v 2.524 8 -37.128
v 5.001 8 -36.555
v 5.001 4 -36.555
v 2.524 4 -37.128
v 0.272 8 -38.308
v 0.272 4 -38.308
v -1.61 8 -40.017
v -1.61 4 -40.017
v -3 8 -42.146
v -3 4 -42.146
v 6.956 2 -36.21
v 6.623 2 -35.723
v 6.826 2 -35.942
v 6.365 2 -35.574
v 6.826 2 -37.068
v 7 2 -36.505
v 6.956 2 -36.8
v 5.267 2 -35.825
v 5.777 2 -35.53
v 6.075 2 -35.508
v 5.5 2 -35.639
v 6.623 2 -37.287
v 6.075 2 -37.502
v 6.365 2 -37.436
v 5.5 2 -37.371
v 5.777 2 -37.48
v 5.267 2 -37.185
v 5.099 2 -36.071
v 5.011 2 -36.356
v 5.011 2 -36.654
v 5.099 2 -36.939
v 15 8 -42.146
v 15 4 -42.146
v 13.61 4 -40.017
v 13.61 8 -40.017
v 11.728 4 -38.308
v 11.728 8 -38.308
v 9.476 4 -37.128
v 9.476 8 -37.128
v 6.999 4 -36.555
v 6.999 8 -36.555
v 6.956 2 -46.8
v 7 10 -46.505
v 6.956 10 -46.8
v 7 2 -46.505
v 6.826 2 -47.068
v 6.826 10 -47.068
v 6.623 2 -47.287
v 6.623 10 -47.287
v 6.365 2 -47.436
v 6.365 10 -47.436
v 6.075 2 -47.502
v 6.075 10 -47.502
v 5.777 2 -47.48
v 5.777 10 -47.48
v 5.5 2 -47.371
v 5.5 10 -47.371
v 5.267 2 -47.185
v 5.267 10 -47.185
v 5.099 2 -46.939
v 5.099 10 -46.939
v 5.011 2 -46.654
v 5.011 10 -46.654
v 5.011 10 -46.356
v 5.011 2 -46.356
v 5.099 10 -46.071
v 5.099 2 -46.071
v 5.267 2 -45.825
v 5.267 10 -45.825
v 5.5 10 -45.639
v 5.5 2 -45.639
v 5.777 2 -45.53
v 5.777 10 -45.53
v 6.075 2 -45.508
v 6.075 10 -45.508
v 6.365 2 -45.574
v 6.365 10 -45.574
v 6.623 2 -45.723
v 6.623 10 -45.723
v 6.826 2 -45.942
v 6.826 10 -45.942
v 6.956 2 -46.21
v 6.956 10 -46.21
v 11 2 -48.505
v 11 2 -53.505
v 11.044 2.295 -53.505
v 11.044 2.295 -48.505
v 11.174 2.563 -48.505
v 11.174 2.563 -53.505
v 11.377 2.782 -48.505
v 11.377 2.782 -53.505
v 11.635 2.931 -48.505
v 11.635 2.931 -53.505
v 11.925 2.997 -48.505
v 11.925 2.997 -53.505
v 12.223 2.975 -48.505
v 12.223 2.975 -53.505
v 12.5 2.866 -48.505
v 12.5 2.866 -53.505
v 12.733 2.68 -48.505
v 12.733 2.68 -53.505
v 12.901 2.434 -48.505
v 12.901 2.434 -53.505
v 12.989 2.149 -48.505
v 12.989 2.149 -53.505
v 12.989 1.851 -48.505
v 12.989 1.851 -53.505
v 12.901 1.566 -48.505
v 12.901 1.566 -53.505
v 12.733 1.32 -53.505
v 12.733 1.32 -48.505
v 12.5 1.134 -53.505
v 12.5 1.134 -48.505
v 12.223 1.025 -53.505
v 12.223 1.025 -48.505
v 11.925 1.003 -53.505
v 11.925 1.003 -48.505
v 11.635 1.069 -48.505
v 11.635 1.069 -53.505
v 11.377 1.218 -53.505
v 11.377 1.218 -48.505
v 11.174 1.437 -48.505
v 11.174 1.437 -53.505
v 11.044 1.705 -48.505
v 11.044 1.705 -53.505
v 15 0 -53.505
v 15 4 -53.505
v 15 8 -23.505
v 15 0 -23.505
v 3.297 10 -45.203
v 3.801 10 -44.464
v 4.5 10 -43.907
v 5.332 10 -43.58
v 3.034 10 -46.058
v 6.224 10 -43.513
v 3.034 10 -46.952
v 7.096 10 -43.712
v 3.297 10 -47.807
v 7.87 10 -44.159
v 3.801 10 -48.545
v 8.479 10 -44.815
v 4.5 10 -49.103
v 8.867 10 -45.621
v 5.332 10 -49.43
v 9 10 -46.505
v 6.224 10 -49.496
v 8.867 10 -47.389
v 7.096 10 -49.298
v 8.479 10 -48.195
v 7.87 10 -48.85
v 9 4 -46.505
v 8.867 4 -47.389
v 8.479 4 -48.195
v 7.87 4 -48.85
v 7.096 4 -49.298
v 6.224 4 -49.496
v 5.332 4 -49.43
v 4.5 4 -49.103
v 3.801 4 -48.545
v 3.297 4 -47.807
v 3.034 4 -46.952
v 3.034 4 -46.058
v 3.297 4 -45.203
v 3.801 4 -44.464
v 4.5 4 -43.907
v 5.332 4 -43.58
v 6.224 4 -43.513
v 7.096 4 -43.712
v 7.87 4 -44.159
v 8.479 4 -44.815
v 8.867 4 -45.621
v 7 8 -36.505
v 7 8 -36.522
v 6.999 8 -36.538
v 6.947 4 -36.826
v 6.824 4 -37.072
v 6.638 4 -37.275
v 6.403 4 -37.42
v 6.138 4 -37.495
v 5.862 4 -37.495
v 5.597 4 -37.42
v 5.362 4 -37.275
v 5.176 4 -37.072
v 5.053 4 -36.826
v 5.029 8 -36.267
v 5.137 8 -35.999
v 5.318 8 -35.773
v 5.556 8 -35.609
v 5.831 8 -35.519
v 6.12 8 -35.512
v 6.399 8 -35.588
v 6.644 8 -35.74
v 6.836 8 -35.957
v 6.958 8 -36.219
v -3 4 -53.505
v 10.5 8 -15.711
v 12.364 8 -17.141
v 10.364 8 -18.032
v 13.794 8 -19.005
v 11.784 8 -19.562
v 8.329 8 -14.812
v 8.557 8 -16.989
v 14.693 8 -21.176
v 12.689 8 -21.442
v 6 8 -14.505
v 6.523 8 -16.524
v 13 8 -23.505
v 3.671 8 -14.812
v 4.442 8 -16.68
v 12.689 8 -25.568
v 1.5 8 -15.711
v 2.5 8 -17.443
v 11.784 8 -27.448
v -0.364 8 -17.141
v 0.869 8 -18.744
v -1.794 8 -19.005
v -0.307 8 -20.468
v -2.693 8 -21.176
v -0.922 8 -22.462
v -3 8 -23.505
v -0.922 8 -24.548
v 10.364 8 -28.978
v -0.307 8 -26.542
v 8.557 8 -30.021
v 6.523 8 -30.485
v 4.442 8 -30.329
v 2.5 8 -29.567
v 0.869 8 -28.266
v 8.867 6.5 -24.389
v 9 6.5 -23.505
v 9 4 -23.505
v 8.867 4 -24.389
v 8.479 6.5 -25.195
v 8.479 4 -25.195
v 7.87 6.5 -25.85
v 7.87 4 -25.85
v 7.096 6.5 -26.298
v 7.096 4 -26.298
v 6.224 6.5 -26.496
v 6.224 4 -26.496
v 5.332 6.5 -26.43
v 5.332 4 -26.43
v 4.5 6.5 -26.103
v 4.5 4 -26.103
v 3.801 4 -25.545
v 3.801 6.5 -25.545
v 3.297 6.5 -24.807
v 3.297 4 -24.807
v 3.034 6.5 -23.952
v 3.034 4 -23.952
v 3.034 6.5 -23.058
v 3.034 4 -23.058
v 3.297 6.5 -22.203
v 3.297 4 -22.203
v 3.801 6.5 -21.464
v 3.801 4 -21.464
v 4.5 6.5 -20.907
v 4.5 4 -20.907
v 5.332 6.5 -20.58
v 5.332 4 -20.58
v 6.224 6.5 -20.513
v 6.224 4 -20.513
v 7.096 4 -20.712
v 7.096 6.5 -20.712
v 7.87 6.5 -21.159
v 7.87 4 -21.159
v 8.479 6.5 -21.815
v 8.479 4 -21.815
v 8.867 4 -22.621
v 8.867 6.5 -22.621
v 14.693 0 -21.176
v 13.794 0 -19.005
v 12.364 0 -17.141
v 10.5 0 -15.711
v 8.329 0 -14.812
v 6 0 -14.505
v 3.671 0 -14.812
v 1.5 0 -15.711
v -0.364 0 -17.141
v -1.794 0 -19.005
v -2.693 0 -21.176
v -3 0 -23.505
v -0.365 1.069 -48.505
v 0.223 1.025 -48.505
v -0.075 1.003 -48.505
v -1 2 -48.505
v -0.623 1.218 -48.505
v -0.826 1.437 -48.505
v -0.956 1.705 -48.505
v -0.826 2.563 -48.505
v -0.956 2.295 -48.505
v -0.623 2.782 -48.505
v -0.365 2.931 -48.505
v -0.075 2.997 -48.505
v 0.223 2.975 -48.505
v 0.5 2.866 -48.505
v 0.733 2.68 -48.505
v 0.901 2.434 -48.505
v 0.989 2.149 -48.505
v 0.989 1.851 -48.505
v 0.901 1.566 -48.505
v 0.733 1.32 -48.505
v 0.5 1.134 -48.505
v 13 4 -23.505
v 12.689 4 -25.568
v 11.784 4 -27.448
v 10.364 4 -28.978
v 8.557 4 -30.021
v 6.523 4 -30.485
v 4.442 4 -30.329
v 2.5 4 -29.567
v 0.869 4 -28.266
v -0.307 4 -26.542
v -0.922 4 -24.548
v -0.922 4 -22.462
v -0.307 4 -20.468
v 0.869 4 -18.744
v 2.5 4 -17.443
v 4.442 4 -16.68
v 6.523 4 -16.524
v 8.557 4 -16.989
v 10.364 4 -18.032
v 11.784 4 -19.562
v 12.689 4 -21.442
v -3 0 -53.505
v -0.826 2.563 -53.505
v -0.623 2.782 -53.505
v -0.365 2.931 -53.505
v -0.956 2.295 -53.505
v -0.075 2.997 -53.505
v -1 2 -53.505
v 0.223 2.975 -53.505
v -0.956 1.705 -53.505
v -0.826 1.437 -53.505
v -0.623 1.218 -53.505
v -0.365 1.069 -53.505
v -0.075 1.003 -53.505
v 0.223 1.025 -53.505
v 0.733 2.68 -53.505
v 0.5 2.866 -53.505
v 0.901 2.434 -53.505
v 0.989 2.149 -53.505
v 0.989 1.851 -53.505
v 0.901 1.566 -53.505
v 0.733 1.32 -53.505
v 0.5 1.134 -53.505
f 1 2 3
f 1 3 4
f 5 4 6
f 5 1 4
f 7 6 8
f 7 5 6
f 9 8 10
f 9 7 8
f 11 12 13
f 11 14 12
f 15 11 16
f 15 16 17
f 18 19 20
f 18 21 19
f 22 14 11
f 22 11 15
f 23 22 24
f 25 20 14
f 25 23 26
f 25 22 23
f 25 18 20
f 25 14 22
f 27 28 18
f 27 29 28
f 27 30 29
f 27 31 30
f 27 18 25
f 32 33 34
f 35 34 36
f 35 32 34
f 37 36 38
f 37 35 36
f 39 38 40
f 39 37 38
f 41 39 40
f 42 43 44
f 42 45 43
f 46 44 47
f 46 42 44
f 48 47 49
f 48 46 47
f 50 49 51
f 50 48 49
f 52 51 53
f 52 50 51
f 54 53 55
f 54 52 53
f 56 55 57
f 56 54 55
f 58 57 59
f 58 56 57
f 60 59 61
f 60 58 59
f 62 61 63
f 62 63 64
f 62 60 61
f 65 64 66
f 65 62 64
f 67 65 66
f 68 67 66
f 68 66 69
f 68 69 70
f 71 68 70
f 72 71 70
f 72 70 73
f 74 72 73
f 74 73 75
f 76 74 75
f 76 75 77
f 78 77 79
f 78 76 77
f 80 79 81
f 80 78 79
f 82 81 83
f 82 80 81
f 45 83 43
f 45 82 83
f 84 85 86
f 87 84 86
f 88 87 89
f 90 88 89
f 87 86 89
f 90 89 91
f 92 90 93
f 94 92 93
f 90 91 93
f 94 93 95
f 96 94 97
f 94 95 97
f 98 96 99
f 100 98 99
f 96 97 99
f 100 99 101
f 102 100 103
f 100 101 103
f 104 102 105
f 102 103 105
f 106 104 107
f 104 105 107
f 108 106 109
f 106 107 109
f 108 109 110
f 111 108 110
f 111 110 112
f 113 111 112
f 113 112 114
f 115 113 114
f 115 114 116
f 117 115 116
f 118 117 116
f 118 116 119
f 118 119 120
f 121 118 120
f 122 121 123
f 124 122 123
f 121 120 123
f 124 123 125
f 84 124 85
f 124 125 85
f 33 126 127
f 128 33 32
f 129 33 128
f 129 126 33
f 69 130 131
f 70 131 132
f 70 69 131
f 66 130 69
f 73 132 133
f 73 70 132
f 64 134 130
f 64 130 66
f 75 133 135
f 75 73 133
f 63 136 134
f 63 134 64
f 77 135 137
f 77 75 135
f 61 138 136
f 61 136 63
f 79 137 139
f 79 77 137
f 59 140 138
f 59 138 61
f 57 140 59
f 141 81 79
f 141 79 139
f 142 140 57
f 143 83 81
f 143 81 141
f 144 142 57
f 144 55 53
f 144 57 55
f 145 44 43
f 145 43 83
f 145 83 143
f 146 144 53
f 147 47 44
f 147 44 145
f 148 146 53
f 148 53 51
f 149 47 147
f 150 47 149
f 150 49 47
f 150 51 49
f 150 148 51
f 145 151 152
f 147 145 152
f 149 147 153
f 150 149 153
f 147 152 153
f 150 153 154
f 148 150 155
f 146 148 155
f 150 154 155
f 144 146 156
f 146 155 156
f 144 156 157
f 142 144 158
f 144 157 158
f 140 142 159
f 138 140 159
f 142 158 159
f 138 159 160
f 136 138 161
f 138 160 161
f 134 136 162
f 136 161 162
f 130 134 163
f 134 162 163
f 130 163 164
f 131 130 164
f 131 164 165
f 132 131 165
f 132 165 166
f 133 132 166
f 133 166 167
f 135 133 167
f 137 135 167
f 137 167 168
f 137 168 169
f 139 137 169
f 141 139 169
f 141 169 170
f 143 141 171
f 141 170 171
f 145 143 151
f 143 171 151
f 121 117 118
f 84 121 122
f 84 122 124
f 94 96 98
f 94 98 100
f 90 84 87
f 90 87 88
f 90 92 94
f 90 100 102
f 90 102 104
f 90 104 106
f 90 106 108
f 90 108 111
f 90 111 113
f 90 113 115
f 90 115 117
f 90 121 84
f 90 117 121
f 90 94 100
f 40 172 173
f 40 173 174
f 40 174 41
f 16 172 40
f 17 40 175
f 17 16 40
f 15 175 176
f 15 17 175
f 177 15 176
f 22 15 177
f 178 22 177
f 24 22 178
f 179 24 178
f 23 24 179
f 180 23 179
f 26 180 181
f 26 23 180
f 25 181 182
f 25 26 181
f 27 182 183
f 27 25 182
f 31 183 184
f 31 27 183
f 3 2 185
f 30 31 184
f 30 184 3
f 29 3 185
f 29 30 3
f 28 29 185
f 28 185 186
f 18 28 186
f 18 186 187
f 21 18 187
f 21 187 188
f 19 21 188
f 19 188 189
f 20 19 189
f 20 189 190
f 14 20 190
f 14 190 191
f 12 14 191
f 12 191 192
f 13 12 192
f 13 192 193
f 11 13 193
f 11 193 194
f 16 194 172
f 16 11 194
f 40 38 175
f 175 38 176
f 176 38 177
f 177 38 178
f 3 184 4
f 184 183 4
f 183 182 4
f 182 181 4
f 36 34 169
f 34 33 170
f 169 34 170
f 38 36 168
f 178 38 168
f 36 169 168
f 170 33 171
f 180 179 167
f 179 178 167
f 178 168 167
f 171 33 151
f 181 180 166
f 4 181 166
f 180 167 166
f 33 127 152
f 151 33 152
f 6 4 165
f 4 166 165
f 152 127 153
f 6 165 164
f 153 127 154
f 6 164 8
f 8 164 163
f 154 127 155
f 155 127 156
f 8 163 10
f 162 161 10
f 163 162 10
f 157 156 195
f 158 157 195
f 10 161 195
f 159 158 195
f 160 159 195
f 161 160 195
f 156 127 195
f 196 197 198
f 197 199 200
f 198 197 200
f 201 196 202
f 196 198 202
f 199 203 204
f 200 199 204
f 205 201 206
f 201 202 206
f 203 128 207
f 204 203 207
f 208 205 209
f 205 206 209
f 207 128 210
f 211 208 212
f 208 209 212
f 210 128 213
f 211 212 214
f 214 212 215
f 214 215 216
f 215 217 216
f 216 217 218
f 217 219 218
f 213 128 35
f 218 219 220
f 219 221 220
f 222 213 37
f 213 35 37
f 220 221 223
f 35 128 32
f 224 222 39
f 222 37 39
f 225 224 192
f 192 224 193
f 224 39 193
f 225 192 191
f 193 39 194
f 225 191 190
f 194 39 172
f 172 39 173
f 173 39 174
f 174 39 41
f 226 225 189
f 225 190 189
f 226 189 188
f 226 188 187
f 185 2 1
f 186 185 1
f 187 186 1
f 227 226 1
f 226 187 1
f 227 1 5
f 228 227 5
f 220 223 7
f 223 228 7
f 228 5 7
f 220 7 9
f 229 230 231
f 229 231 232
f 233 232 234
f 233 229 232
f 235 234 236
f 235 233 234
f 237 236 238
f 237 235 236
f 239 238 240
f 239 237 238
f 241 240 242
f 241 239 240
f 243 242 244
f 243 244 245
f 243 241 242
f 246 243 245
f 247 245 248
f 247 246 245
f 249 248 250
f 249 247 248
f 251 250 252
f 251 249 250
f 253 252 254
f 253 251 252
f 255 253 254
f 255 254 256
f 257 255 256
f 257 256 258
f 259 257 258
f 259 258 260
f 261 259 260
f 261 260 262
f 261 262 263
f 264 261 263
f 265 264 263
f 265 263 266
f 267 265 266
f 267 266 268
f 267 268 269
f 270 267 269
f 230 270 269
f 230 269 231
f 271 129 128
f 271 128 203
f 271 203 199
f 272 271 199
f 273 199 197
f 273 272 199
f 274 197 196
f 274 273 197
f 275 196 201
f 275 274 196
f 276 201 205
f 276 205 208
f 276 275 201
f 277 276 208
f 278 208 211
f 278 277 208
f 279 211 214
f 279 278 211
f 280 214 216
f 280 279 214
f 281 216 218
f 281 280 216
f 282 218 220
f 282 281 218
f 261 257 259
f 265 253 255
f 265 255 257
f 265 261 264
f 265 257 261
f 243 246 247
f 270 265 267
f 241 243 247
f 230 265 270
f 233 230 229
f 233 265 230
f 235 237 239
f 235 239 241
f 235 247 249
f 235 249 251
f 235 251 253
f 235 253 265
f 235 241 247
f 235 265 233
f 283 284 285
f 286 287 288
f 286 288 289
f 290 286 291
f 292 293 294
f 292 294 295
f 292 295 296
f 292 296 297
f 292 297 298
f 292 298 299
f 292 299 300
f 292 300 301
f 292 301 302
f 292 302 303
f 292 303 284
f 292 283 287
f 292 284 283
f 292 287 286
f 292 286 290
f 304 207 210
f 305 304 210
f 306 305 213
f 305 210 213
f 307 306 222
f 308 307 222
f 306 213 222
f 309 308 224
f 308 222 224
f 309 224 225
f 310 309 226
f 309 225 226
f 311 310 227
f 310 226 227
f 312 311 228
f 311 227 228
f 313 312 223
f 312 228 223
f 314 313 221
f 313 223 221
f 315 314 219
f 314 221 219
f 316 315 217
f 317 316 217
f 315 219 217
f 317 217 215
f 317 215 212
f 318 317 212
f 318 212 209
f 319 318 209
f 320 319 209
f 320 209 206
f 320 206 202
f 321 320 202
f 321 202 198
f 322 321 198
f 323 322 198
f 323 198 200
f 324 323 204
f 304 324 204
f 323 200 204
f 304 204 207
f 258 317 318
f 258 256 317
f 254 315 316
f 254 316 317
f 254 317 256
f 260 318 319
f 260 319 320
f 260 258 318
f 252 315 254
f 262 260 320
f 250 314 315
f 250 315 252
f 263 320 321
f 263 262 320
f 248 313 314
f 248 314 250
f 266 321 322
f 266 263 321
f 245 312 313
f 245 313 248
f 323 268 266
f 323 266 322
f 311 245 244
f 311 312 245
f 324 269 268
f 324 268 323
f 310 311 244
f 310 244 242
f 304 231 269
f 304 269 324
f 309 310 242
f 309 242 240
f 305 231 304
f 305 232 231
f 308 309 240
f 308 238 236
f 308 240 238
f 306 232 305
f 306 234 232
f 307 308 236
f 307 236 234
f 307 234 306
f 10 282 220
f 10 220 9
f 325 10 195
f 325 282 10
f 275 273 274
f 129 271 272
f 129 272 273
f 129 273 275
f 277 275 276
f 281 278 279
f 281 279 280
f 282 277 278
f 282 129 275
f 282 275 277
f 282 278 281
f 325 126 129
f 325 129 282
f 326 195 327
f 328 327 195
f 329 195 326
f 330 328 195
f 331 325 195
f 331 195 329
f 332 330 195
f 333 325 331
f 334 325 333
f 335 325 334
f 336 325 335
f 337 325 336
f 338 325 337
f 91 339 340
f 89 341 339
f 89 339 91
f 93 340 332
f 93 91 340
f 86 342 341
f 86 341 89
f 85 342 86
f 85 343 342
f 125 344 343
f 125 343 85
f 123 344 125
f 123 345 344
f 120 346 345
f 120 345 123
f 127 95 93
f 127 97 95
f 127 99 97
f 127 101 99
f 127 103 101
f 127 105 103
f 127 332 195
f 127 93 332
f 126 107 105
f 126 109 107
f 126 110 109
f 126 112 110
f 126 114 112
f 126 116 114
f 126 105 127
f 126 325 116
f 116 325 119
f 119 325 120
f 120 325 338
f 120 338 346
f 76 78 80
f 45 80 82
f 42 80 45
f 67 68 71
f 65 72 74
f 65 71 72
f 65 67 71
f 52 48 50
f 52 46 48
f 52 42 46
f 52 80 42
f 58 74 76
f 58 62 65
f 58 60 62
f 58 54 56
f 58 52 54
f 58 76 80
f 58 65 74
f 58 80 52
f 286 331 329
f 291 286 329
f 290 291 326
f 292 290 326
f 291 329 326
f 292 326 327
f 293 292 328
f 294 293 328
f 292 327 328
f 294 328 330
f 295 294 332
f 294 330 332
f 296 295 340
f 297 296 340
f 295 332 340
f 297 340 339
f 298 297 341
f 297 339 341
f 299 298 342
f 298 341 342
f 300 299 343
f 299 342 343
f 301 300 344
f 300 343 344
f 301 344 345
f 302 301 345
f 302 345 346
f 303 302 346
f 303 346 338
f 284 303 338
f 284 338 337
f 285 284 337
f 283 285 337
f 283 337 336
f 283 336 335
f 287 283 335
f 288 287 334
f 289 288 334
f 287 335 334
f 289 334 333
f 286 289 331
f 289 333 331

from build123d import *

# Parameters (mm, degrees)
SKETCH1_R           = 1
BOSS_EXTRUDE1_DEPTH = 8
SKETCH2_R           = 7
SKETCH2_R_2         = 3
CUT_EXTRUDE1_DEPTH  = 4
SKETCH3_R           = 3
CUT_EXTRUDE2_DEPTH  = 1.5
CUT_EXTRUDE3_DEPTH  = 4
BOSS_EXTRUDE2_START = -10
SKETCH5_W           = 30
SKETCH5_H           = 2
BOSS_EXTRUDE2_DEPTH = 2
SKETCH6_R           = 3
SKETCH6_R_2         = 1
BOSS_EXTRUDE3_DEPTH = 6
SKETCH7_R           = 1
CUT_EXTRUDE4_DEPTH  = 5


with BuildPart() as part:
    # Sketch1 → Boss-Extrude1 (new body)
    with BuildSketch(Plane(origin=(0, 0, 0), x_dir=(1, 0, 0), z_dir=(0, 1, 0))):
        with BuildLine():
            Line((-3, 53.504881109), (15, 53.504881109))
            Line((15, 53.504881109), (15, 23.504881109))
            ThreePointArc((15, 23.504881109), (6, 14.504881109), (-3, 23.504881109))
            Line((-3, 23.504881109), (-3, 53.504881109))
        make_face()
        with Locations((6, 36.504881109)):
            Circle(SKETCH1_R, mode=Mode.SUBTRACT)
        with Locations((6, 46.504881109)):
            Circle(SKETCH1_R, mode=Mode.SUBTRACT)
    extrude(amount=BOSS_EXTRUDE1_DEPTH)

    # Sketch2 → Cut-Extrude1 (cut)
    with BuildSketch(Plane(origin=(0, 8, 0), x_dir=(1, 0, 0), z_dir=(0, 1, 0))):
        with Locations((6, 23.504881109)):
            Circle(SKETCH2_R)
        with Locations((6, 23.504881109)):
            Circle(SKETCH2_R_2, mode=Mode.SUBTRACT)
    extrude(amount=-CUT_EXTRUDE1_DEPTH, mode=Mode.SUBTRACT)

    # Sketch3 → Cut-Extrude2 (cut)
    with BuildSketch(Plane(origin=(0, 8, 0), x_dir=(1, 0, 0), z_dir=(0, 1, 0))):
        with Locations((6, 23.504881109)):
            Circle(SKETCH3_R)
    extrude(amount=-CUT_EXTRUDE2_DEPTH, mode=Mode.SUBTRACT)

    # Sketch4 → Cut-Extrude3 (cut)
    with BuildSketch(Plane(origin=(0, 8, 0), x_dir=(1, 0, 0), z_dir=(0, 1, 0))):
        with BuildLine():
            Line((-4, 46.504881109), (-4, 53.993644797))
            Line((-4, 53.993644797), (16, 53.993644797))
            Line((16, 53.993644797), (16, 46.504881109))
            ThreePointArc((16, 46.504881109), (6, 36.504881109), (-4, 46.504881109))
        make_face()
    extrude(amount=-CUT_EXTRUDE3_DEPTH, mode=Mode.SUBTRACT)

    # Sketch5 → Boss-Extrude2 (add)
    with BuildSketch(Plane(origin=(15, 0, 0), x_dir=(0, 0, -1), z_dir=(1, 0, 0)).offset(BOSS_EXTRUDE2_START)):
        with Locations((38.504881109, 1)):
            Rectangle(SKETCH5_W, SKETCH5_H)
    extrude(amount=BOSS_EXTRUDE2_DEPTH)

    # Sketch6 → Boss-Extrude3 (add)
    with BuildSketch(Plane(origin=(0, 4, 0), x_dir=(1, 0, 0), z_dir=(0, 1, 0))):
        with Locations((6, 46.504881109)):
            Circle(SKETCH6_R)
        with Locations((6, 46.504881109)):
            Circle(SKETCH6_R_2, mode=Mode.SUBTRACT)
    extrude(amount=BOSS_EXTRUDE3_DEPTH)

    # Sketch7 → Cut-Extrude4 (cut)
    with BuildSketch(Plane(origin=(0, 0, -53.504881109), x_dir=(-1, 0, 0), z_dir=(0, 0, -1))):
        with Locations((-12, 2)):
            Circle(SKETCH7_R)
        with Locations((0, 2)):
            Circle(SKETCH7_R)
    extrude(amount=-CUT_EXTRUDE4_DEPTH, mode=Mode.SUBTRACT)


solid = part.part
